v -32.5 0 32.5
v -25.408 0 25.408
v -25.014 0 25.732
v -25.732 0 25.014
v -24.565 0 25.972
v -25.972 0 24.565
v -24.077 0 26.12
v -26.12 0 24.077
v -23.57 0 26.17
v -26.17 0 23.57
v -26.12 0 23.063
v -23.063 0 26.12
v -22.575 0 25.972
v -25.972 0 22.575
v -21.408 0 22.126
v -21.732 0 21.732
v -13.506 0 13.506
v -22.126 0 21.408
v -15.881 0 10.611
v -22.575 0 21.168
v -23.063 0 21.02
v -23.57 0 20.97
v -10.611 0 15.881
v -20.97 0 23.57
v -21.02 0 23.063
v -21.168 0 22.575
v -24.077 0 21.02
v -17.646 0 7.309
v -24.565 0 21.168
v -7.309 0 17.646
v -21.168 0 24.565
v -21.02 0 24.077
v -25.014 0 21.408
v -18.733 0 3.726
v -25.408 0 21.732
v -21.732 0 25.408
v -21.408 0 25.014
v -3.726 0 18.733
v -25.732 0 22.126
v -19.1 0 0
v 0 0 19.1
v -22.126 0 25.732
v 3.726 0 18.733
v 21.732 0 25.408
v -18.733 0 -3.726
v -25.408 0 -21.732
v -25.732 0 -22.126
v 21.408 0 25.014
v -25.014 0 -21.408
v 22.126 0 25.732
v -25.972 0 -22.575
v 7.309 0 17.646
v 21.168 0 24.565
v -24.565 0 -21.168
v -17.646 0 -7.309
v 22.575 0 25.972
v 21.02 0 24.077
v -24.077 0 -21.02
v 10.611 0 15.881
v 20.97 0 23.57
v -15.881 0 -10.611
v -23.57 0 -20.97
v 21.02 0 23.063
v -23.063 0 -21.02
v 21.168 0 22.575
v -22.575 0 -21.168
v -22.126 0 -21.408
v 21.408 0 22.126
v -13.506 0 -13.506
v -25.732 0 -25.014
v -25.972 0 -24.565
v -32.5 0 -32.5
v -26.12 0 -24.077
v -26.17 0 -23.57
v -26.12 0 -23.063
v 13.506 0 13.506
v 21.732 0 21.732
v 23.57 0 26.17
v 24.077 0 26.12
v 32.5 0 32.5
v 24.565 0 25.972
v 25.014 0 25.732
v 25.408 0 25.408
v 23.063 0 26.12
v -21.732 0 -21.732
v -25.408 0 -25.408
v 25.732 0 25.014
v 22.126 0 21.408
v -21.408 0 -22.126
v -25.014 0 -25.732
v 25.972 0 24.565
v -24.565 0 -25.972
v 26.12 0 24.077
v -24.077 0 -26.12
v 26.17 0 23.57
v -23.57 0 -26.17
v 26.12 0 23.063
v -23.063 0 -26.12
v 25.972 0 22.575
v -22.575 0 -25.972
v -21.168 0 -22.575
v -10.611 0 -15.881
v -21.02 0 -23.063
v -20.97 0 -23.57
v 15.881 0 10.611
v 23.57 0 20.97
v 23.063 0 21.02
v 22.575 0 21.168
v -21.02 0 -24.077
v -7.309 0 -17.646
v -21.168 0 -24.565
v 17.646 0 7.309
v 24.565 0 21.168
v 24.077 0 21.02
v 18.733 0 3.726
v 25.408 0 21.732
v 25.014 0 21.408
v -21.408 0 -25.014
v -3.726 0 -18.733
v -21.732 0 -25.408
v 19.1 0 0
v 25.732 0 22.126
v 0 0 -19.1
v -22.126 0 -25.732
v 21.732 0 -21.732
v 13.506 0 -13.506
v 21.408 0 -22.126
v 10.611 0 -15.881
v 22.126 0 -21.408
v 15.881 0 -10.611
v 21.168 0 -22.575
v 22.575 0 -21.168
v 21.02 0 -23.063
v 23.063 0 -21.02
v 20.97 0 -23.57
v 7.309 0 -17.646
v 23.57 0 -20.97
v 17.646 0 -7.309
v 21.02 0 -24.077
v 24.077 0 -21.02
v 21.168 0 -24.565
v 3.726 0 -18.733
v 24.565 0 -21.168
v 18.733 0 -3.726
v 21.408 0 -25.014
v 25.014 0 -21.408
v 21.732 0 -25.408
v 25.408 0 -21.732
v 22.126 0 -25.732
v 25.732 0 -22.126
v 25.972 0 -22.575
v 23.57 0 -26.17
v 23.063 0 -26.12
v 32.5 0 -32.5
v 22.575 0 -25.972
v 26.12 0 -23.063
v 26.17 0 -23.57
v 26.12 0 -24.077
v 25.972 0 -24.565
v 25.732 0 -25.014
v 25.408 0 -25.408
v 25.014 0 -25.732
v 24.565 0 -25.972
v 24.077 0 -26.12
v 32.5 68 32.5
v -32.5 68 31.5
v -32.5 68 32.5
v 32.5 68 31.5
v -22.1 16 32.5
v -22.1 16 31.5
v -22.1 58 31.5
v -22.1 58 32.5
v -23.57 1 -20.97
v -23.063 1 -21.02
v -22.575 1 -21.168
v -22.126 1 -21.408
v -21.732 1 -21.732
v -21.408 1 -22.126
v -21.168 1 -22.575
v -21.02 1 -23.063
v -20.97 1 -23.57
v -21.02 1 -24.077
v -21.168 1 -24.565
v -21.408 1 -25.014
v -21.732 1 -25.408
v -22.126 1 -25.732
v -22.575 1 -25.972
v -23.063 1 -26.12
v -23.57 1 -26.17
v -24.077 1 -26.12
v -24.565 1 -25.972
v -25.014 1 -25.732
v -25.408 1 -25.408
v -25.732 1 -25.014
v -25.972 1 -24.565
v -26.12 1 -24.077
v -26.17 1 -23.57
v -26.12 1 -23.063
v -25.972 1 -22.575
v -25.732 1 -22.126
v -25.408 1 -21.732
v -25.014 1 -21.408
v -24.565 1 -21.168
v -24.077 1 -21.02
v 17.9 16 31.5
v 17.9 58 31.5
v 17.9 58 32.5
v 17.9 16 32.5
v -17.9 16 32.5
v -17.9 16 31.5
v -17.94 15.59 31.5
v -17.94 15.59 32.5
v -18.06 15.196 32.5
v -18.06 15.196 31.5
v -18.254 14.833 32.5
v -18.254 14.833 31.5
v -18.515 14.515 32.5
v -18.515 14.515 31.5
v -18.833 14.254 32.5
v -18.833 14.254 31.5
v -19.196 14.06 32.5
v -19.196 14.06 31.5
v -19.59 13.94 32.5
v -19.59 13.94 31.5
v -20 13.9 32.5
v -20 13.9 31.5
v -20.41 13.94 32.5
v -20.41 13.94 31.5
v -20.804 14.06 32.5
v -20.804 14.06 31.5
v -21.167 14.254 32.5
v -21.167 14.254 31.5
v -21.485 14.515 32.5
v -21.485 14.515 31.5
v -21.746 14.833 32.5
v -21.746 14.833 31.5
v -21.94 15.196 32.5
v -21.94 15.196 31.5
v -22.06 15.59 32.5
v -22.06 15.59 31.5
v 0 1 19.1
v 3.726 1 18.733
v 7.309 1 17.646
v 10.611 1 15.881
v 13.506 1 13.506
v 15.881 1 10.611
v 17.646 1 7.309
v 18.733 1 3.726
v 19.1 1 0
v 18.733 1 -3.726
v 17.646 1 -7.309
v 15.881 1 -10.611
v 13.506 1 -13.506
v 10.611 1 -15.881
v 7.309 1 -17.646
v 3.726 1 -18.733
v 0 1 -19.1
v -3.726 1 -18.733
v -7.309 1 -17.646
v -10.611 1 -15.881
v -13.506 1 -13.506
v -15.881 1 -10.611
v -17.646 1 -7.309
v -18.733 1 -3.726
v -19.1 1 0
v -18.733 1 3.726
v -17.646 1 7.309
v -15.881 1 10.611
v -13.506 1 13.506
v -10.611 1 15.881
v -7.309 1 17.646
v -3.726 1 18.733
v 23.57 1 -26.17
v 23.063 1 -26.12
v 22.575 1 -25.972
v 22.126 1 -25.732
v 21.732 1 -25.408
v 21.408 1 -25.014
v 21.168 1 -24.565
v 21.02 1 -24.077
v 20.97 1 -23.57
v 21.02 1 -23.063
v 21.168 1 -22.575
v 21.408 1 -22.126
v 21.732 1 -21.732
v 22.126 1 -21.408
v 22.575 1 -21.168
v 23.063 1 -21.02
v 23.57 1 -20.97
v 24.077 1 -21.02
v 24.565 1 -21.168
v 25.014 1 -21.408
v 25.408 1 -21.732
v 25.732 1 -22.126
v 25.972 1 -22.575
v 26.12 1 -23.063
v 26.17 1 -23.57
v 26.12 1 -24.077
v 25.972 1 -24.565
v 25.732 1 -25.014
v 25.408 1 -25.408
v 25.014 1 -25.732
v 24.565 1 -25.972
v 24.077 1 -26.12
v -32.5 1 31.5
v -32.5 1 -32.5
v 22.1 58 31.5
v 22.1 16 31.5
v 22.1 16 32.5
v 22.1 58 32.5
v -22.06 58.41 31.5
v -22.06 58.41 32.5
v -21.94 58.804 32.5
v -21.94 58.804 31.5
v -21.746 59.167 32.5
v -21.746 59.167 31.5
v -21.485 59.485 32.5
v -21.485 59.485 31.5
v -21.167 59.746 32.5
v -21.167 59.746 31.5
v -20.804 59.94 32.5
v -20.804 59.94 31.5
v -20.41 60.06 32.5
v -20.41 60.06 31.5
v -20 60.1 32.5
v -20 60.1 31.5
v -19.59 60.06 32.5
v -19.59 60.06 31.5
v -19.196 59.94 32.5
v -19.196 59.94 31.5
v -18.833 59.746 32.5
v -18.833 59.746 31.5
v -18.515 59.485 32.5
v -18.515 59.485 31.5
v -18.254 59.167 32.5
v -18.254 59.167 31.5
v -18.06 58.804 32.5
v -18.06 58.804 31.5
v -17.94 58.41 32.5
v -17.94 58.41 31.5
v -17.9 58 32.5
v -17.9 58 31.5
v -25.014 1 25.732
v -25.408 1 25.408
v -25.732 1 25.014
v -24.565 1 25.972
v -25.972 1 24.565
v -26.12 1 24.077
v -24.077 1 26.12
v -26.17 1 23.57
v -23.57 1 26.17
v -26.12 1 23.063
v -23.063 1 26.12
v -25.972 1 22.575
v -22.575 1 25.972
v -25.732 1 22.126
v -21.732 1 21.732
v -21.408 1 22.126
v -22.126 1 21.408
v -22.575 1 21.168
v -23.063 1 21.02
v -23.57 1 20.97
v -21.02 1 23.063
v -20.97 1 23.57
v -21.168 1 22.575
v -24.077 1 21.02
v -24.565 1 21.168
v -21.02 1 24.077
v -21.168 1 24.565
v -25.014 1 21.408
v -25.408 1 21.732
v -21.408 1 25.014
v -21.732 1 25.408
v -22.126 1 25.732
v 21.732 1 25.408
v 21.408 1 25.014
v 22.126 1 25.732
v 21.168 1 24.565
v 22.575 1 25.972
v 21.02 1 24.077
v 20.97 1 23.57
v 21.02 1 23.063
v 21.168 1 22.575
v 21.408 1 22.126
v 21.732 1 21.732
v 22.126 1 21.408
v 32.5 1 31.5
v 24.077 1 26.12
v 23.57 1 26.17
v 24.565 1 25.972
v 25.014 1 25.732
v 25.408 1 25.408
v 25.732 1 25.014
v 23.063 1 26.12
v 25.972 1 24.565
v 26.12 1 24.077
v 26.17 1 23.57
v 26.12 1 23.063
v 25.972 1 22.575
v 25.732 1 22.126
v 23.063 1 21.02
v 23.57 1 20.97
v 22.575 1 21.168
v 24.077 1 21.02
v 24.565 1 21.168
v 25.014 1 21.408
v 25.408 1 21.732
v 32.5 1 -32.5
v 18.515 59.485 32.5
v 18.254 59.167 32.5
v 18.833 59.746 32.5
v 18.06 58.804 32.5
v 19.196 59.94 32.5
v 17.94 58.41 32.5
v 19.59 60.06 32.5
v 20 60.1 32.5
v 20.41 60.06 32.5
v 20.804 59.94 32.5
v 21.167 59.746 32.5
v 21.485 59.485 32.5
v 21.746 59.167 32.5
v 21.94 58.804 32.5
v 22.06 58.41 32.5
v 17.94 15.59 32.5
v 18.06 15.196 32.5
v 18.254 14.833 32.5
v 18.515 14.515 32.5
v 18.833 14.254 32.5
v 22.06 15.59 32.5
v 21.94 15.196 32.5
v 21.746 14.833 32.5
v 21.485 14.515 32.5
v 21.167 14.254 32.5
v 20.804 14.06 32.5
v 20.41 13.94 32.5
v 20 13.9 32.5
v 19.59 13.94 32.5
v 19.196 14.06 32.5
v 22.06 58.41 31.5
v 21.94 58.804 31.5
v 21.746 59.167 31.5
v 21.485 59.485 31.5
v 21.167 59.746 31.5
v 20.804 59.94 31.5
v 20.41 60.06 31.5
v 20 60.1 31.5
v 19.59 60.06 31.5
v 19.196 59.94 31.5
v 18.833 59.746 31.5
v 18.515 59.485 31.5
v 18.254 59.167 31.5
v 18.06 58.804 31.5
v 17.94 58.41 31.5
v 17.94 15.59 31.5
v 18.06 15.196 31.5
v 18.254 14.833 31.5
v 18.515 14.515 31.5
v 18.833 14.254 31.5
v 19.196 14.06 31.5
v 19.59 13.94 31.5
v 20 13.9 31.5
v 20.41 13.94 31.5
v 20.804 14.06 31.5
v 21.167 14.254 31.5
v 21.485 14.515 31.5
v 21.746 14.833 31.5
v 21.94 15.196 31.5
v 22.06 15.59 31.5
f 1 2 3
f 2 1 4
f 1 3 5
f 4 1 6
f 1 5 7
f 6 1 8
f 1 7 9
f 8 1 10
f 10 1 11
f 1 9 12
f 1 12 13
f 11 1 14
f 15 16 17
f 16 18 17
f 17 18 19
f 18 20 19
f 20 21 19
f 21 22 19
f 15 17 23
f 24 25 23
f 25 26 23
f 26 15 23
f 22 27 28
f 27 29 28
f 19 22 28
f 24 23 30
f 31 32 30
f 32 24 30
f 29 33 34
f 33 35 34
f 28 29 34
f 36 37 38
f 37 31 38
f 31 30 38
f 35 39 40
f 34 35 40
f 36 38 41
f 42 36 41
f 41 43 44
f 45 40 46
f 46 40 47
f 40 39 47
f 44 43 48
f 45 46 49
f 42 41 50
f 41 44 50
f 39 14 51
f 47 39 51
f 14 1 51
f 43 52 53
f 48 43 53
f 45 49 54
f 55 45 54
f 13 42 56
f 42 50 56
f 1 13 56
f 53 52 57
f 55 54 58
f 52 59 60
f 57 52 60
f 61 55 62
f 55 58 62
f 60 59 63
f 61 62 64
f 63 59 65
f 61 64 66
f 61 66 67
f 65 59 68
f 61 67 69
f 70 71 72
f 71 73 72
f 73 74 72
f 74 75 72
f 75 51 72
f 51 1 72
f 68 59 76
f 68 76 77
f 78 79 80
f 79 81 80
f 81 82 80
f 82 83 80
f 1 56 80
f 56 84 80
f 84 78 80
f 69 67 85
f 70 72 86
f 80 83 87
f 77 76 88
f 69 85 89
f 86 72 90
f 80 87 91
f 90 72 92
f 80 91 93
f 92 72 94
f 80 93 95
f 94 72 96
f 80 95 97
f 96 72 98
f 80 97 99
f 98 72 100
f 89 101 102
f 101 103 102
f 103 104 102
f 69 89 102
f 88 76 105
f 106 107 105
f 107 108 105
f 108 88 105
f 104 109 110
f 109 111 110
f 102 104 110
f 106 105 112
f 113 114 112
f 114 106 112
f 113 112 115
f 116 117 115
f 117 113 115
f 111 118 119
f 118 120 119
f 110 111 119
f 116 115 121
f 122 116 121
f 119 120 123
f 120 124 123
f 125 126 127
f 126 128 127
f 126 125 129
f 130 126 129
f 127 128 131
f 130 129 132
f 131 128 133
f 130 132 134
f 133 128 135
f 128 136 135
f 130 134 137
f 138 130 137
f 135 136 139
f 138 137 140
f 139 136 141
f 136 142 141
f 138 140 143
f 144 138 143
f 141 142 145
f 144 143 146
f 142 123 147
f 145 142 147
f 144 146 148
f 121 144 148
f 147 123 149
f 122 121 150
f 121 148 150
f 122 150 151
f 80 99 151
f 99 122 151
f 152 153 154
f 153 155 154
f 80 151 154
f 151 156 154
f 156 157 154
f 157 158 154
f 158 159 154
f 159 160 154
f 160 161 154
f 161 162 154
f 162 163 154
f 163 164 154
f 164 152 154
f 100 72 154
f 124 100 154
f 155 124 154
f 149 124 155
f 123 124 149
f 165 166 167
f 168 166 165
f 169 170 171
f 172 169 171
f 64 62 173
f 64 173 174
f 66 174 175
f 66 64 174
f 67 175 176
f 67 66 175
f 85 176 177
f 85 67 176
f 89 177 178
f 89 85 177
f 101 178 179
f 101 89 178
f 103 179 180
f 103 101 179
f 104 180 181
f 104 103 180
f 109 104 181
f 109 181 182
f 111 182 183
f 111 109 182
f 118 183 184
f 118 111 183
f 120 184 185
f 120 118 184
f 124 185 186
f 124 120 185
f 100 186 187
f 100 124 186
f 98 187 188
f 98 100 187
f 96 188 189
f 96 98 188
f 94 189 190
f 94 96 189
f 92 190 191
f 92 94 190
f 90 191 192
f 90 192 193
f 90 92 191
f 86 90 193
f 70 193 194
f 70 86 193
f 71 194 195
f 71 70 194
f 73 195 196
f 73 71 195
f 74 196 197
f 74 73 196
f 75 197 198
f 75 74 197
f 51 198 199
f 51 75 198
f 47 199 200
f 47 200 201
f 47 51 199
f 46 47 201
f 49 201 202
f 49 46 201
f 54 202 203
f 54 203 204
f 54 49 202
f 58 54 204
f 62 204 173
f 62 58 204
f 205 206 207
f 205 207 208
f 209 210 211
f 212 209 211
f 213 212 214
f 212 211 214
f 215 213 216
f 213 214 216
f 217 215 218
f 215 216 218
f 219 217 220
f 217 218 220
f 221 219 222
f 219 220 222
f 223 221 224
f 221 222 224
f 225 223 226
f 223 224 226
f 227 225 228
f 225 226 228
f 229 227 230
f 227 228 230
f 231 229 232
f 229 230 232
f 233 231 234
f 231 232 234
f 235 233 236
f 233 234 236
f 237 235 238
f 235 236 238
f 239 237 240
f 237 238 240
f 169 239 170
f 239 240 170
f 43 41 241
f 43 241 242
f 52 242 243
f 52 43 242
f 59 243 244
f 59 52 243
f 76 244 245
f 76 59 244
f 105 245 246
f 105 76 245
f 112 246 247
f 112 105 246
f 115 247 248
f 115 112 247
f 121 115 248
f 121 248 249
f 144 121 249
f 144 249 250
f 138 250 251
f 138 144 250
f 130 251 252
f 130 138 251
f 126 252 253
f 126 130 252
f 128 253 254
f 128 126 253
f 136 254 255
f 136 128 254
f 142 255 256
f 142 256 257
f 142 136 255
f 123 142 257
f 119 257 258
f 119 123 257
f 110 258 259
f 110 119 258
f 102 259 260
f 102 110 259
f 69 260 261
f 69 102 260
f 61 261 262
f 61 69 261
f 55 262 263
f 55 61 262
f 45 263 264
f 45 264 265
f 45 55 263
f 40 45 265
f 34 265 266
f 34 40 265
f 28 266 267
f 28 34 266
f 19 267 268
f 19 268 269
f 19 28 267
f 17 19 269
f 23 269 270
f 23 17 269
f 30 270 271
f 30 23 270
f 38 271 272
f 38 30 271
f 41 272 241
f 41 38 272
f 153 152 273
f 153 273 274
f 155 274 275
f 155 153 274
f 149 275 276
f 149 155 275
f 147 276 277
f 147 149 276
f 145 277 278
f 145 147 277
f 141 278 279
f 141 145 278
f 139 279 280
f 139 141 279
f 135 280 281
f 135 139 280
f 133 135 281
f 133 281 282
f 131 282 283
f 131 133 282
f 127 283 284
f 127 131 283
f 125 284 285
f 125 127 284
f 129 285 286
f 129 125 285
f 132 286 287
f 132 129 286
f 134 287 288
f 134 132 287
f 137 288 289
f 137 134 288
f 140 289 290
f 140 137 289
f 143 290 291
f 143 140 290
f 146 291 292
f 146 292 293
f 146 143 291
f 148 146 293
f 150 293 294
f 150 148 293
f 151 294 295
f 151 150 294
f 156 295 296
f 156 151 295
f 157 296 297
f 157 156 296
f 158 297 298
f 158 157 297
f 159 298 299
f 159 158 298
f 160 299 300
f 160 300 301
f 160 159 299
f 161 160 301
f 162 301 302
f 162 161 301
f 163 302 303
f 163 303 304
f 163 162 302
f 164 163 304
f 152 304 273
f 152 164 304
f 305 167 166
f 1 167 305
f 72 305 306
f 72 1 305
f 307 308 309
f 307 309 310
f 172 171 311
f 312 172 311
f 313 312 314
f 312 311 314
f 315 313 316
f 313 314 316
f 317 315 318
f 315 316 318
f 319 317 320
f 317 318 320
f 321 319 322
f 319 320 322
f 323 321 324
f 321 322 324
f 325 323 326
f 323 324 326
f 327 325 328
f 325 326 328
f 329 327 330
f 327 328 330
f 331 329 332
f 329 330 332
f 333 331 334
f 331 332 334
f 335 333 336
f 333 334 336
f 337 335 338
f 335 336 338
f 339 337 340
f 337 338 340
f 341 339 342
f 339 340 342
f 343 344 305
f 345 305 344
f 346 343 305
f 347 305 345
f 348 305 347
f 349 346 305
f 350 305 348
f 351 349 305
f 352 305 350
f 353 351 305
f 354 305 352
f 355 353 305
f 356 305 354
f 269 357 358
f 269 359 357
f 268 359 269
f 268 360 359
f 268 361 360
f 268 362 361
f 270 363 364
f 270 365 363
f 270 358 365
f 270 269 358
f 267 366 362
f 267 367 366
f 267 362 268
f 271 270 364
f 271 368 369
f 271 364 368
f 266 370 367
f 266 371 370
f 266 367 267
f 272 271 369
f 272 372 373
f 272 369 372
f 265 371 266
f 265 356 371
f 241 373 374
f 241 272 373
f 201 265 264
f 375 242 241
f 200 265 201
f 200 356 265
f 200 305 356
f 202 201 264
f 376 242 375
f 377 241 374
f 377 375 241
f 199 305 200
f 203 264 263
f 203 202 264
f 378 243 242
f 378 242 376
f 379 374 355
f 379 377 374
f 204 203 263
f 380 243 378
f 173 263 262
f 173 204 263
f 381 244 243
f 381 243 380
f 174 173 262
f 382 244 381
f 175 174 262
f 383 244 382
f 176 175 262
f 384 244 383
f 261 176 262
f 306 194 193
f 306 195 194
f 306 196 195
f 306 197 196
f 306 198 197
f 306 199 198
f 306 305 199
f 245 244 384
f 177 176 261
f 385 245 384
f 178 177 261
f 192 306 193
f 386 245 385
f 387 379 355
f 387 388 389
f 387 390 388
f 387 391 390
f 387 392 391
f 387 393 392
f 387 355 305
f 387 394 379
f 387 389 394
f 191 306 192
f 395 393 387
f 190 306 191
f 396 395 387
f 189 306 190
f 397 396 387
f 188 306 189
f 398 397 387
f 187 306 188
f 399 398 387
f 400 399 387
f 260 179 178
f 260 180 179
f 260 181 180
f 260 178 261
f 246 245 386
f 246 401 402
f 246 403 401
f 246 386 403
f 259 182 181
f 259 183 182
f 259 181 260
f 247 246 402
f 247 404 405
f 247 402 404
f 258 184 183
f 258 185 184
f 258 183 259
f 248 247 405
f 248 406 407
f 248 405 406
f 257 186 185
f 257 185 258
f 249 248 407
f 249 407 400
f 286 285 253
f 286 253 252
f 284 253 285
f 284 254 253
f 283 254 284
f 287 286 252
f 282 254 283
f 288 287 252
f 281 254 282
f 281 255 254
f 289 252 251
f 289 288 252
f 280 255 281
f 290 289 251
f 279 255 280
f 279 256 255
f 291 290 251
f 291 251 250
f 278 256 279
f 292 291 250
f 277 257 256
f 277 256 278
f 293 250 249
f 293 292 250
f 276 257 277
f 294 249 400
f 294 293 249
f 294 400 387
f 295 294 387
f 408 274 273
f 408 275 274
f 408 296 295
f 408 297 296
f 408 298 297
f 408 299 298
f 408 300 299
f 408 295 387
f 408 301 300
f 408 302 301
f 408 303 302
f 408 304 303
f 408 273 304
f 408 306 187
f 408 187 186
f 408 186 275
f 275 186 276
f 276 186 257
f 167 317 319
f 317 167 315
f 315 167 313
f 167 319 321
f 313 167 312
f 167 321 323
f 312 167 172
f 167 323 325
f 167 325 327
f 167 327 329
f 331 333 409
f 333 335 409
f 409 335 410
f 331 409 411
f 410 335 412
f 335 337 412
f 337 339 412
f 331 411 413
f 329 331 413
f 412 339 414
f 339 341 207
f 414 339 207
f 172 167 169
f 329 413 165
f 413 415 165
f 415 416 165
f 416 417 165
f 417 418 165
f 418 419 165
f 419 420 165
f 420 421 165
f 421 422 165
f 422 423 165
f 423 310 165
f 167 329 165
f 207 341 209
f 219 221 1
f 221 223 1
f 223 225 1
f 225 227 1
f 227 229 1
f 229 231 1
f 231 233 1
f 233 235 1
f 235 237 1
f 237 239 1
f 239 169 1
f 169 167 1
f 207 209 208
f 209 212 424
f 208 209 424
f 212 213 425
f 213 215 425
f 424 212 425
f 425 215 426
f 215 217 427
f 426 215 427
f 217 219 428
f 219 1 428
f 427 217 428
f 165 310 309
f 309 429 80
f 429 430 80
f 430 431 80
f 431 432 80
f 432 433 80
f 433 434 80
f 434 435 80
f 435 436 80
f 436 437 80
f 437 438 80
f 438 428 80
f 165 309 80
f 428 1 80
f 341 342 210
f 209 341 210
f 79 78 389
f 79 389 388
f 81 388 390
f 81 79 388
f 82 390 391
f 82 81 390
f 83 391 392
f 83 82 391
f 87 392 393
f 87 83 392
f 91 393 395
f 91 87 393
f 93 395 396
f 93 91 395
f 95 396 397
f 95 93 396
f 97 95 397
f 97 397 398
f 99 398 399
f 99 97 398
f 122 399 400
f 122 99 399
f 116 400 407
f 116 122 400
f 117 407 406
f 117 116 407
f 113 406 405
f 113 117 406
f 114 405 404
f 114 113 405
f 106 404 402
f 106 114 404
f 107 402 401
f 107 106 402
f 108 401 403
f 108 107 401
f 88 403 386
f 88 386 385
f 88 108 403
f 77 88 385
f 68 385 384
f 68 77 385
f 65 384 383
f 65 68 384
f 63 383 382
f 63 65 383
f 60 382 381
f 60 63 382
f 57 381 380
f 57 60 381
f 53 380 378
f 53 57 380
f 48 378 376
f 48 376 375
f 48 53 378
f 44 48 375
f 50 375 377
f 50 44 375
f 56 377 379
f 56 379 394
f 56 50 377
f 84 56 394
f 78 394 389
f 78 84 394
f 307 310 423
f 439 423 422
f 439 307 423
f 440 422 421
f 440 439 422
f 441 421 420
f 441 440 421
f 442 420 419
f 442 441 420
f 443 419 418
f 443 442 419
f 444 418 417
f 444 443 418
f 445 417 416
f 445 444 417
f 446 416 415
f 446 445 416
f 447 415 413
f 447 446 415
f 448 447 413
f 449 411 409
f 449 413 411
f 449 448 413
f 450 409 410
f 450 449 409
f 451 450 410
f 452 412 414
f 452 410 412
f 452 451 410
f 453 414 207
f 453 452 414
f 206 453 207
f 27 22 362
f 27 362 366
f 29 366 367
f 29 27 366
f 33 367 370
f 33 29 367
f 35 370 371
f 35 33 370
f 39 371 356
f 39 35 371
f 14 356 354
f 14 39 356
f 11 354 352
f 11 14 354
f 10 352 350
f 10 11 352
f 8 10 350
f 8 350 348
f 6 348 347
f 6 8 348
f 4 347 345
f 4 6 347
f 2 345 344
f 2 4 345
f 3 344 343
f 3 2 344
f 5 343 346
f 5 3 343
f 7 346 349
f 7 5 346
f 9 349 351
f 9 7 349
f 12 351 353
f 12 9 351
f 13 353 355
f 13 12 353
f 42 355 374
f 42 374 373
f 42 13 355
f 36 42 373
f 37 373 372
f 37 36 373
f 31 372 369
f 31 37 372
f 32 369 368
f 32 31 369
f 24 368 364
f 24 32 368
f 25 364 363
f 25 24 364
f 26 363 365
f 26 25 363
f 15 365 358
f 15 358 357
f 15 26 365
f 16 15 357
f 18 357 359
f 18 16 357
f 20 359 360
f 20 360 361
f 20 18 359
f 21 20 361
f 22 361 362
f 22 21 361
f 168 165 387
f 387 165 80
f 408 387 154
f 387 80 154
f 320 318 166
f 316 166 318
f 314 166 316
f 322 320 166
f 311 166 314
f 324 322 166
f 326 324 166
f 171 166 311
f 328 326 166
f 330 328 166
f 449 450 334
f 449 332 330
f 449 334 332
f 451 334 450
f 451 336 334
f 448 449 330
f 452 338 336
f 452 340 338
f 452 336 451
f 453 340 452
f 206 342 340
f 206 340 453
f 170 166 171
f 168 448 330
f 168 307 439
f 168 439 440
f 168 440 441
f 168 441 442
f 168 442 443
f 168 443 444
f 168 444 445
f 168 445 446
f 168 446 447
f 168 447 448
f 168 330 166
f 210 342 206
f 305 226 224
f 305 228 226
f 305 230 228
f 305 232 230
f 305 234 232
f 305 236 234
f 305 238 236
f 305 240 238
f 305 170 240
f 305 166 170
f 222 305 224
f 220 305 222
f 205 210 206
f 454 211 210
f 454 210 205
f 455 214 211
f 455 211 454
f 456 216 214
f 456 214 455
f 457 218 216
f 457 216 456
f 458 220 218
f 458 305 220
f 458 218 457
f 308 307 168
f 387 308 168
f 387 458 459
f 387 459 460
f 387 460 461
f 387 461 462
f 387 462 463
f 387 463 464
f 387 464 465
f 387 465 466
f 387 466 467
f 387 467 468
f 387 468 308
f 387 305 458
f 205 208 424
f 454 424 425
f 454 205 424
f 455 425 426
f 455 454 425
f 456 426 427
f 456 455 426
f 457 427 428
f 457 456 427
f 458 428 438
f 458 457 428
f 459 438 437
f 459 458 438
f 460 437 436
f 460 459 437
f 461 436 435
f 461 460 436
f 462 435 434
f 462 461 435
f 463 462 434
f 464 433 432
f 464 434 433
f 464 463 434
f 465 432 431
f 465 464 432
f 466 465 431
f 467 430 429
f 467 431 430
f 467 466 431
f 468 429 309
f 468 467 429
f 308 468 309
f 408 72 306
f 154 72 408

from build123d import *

# Parameters (mm, degrees)
SKETCH_1_W          = 65
SKETCH_1_H          = 65
SKETCH_1_R          = 2.6
SKETCH_1_R_2        = 19.1
EXTRUDE_1_DEPTH     = 1
SKETCH_2_W          = 65
SKETCH_2_H          = 1
EXTRUDE_2_DEPTH     = 67
CUT_EXTRUDE_1_DEPTH = 99.874920986


with BuildPart() as part:
    # 草图1 → 凸台-拉伸1 (new body)
    with BuildSketch(Plane(origin=(0, 0, 0), x_dir=(1, 0, 0), z_dir=(0, 1, 0))):
        Rectangle(SKETCH_1_W, SKETCH_1_H)
        with Locations(Location((-23.57, 23.57, 0), (0, 0, 270))):
            Circle(SKETCH_1_R, mode=Mode.SUBTRACT)
        with Locations(Location((23.57, 23.57, 0), (0, 0, 90))):
            Circle(SKETCH_1_R, mode=Mode.SUBTRACT)
        with Locations(Location((23.57, -23.57, 0), (0, 0, 270))):
            Circle(SKETCH_1_R, mode=Mode.SUBTRACT)
        with Locations(Location((-23.57, -23.57, 0), (0, 0, 90))):
            Circle(SKETCH_1_R, mode=Mode.SUBTRACT)
        with Locations(Location((0, 0, 0), (0, 0, 270))):
            Circle(SKETCH_1_R_2, mode=Mode.SUBTRACT)
    extrude(amount=EXTRUDE_1_DEPTH)

    # 草图2 → 凸台-拉伸2 (add)
    with BuildSketch(Plane(origin=(0, 1, 0), x_dir=(1, 0, 0), z_dir=(0, 1, 0))):
        with Locations((0, -32)):
            Rectangle(SKETCH_2_W, SKETCH_2_H)
    extrude(amount=EXTRUDE_2_DEPTH)

    # 草图3 → 切除-拉伸1 (cut, through all)
    with BuildSketch(Plane(origin=(0, 0, 31.5), x_dir=(-1, 0, 0), z_dir=(0, 0, -1))):
        with BuildLine():
            Line((-17.9, 58), (-17.9, 16))
            ThreePointArc((-17.9, 16), (-20, 13.9), (-22.1, 16))
            Line((-22.1, 16), (-22.1, 58))
            ThreePointArc((-22.1, 58), (-20, 60.1), (-17.9, 58))
        make_face()
        with BuildLine():
            Line((17.9, 58), (17.9, 16))
            ThreePointArc((17.9, 16), (20, 13.9), (22.1, 16))
            Line((22.1, 16), (22.1, 58))
            ThreePointArc((22.1, 58), (20, 60.1), (17.9, 58))
        make_face()
    extrude(amount=-CUT_EXTRUDE_1_DEPTH, mode=Mode.SUBTRACT)


solid = part.part
